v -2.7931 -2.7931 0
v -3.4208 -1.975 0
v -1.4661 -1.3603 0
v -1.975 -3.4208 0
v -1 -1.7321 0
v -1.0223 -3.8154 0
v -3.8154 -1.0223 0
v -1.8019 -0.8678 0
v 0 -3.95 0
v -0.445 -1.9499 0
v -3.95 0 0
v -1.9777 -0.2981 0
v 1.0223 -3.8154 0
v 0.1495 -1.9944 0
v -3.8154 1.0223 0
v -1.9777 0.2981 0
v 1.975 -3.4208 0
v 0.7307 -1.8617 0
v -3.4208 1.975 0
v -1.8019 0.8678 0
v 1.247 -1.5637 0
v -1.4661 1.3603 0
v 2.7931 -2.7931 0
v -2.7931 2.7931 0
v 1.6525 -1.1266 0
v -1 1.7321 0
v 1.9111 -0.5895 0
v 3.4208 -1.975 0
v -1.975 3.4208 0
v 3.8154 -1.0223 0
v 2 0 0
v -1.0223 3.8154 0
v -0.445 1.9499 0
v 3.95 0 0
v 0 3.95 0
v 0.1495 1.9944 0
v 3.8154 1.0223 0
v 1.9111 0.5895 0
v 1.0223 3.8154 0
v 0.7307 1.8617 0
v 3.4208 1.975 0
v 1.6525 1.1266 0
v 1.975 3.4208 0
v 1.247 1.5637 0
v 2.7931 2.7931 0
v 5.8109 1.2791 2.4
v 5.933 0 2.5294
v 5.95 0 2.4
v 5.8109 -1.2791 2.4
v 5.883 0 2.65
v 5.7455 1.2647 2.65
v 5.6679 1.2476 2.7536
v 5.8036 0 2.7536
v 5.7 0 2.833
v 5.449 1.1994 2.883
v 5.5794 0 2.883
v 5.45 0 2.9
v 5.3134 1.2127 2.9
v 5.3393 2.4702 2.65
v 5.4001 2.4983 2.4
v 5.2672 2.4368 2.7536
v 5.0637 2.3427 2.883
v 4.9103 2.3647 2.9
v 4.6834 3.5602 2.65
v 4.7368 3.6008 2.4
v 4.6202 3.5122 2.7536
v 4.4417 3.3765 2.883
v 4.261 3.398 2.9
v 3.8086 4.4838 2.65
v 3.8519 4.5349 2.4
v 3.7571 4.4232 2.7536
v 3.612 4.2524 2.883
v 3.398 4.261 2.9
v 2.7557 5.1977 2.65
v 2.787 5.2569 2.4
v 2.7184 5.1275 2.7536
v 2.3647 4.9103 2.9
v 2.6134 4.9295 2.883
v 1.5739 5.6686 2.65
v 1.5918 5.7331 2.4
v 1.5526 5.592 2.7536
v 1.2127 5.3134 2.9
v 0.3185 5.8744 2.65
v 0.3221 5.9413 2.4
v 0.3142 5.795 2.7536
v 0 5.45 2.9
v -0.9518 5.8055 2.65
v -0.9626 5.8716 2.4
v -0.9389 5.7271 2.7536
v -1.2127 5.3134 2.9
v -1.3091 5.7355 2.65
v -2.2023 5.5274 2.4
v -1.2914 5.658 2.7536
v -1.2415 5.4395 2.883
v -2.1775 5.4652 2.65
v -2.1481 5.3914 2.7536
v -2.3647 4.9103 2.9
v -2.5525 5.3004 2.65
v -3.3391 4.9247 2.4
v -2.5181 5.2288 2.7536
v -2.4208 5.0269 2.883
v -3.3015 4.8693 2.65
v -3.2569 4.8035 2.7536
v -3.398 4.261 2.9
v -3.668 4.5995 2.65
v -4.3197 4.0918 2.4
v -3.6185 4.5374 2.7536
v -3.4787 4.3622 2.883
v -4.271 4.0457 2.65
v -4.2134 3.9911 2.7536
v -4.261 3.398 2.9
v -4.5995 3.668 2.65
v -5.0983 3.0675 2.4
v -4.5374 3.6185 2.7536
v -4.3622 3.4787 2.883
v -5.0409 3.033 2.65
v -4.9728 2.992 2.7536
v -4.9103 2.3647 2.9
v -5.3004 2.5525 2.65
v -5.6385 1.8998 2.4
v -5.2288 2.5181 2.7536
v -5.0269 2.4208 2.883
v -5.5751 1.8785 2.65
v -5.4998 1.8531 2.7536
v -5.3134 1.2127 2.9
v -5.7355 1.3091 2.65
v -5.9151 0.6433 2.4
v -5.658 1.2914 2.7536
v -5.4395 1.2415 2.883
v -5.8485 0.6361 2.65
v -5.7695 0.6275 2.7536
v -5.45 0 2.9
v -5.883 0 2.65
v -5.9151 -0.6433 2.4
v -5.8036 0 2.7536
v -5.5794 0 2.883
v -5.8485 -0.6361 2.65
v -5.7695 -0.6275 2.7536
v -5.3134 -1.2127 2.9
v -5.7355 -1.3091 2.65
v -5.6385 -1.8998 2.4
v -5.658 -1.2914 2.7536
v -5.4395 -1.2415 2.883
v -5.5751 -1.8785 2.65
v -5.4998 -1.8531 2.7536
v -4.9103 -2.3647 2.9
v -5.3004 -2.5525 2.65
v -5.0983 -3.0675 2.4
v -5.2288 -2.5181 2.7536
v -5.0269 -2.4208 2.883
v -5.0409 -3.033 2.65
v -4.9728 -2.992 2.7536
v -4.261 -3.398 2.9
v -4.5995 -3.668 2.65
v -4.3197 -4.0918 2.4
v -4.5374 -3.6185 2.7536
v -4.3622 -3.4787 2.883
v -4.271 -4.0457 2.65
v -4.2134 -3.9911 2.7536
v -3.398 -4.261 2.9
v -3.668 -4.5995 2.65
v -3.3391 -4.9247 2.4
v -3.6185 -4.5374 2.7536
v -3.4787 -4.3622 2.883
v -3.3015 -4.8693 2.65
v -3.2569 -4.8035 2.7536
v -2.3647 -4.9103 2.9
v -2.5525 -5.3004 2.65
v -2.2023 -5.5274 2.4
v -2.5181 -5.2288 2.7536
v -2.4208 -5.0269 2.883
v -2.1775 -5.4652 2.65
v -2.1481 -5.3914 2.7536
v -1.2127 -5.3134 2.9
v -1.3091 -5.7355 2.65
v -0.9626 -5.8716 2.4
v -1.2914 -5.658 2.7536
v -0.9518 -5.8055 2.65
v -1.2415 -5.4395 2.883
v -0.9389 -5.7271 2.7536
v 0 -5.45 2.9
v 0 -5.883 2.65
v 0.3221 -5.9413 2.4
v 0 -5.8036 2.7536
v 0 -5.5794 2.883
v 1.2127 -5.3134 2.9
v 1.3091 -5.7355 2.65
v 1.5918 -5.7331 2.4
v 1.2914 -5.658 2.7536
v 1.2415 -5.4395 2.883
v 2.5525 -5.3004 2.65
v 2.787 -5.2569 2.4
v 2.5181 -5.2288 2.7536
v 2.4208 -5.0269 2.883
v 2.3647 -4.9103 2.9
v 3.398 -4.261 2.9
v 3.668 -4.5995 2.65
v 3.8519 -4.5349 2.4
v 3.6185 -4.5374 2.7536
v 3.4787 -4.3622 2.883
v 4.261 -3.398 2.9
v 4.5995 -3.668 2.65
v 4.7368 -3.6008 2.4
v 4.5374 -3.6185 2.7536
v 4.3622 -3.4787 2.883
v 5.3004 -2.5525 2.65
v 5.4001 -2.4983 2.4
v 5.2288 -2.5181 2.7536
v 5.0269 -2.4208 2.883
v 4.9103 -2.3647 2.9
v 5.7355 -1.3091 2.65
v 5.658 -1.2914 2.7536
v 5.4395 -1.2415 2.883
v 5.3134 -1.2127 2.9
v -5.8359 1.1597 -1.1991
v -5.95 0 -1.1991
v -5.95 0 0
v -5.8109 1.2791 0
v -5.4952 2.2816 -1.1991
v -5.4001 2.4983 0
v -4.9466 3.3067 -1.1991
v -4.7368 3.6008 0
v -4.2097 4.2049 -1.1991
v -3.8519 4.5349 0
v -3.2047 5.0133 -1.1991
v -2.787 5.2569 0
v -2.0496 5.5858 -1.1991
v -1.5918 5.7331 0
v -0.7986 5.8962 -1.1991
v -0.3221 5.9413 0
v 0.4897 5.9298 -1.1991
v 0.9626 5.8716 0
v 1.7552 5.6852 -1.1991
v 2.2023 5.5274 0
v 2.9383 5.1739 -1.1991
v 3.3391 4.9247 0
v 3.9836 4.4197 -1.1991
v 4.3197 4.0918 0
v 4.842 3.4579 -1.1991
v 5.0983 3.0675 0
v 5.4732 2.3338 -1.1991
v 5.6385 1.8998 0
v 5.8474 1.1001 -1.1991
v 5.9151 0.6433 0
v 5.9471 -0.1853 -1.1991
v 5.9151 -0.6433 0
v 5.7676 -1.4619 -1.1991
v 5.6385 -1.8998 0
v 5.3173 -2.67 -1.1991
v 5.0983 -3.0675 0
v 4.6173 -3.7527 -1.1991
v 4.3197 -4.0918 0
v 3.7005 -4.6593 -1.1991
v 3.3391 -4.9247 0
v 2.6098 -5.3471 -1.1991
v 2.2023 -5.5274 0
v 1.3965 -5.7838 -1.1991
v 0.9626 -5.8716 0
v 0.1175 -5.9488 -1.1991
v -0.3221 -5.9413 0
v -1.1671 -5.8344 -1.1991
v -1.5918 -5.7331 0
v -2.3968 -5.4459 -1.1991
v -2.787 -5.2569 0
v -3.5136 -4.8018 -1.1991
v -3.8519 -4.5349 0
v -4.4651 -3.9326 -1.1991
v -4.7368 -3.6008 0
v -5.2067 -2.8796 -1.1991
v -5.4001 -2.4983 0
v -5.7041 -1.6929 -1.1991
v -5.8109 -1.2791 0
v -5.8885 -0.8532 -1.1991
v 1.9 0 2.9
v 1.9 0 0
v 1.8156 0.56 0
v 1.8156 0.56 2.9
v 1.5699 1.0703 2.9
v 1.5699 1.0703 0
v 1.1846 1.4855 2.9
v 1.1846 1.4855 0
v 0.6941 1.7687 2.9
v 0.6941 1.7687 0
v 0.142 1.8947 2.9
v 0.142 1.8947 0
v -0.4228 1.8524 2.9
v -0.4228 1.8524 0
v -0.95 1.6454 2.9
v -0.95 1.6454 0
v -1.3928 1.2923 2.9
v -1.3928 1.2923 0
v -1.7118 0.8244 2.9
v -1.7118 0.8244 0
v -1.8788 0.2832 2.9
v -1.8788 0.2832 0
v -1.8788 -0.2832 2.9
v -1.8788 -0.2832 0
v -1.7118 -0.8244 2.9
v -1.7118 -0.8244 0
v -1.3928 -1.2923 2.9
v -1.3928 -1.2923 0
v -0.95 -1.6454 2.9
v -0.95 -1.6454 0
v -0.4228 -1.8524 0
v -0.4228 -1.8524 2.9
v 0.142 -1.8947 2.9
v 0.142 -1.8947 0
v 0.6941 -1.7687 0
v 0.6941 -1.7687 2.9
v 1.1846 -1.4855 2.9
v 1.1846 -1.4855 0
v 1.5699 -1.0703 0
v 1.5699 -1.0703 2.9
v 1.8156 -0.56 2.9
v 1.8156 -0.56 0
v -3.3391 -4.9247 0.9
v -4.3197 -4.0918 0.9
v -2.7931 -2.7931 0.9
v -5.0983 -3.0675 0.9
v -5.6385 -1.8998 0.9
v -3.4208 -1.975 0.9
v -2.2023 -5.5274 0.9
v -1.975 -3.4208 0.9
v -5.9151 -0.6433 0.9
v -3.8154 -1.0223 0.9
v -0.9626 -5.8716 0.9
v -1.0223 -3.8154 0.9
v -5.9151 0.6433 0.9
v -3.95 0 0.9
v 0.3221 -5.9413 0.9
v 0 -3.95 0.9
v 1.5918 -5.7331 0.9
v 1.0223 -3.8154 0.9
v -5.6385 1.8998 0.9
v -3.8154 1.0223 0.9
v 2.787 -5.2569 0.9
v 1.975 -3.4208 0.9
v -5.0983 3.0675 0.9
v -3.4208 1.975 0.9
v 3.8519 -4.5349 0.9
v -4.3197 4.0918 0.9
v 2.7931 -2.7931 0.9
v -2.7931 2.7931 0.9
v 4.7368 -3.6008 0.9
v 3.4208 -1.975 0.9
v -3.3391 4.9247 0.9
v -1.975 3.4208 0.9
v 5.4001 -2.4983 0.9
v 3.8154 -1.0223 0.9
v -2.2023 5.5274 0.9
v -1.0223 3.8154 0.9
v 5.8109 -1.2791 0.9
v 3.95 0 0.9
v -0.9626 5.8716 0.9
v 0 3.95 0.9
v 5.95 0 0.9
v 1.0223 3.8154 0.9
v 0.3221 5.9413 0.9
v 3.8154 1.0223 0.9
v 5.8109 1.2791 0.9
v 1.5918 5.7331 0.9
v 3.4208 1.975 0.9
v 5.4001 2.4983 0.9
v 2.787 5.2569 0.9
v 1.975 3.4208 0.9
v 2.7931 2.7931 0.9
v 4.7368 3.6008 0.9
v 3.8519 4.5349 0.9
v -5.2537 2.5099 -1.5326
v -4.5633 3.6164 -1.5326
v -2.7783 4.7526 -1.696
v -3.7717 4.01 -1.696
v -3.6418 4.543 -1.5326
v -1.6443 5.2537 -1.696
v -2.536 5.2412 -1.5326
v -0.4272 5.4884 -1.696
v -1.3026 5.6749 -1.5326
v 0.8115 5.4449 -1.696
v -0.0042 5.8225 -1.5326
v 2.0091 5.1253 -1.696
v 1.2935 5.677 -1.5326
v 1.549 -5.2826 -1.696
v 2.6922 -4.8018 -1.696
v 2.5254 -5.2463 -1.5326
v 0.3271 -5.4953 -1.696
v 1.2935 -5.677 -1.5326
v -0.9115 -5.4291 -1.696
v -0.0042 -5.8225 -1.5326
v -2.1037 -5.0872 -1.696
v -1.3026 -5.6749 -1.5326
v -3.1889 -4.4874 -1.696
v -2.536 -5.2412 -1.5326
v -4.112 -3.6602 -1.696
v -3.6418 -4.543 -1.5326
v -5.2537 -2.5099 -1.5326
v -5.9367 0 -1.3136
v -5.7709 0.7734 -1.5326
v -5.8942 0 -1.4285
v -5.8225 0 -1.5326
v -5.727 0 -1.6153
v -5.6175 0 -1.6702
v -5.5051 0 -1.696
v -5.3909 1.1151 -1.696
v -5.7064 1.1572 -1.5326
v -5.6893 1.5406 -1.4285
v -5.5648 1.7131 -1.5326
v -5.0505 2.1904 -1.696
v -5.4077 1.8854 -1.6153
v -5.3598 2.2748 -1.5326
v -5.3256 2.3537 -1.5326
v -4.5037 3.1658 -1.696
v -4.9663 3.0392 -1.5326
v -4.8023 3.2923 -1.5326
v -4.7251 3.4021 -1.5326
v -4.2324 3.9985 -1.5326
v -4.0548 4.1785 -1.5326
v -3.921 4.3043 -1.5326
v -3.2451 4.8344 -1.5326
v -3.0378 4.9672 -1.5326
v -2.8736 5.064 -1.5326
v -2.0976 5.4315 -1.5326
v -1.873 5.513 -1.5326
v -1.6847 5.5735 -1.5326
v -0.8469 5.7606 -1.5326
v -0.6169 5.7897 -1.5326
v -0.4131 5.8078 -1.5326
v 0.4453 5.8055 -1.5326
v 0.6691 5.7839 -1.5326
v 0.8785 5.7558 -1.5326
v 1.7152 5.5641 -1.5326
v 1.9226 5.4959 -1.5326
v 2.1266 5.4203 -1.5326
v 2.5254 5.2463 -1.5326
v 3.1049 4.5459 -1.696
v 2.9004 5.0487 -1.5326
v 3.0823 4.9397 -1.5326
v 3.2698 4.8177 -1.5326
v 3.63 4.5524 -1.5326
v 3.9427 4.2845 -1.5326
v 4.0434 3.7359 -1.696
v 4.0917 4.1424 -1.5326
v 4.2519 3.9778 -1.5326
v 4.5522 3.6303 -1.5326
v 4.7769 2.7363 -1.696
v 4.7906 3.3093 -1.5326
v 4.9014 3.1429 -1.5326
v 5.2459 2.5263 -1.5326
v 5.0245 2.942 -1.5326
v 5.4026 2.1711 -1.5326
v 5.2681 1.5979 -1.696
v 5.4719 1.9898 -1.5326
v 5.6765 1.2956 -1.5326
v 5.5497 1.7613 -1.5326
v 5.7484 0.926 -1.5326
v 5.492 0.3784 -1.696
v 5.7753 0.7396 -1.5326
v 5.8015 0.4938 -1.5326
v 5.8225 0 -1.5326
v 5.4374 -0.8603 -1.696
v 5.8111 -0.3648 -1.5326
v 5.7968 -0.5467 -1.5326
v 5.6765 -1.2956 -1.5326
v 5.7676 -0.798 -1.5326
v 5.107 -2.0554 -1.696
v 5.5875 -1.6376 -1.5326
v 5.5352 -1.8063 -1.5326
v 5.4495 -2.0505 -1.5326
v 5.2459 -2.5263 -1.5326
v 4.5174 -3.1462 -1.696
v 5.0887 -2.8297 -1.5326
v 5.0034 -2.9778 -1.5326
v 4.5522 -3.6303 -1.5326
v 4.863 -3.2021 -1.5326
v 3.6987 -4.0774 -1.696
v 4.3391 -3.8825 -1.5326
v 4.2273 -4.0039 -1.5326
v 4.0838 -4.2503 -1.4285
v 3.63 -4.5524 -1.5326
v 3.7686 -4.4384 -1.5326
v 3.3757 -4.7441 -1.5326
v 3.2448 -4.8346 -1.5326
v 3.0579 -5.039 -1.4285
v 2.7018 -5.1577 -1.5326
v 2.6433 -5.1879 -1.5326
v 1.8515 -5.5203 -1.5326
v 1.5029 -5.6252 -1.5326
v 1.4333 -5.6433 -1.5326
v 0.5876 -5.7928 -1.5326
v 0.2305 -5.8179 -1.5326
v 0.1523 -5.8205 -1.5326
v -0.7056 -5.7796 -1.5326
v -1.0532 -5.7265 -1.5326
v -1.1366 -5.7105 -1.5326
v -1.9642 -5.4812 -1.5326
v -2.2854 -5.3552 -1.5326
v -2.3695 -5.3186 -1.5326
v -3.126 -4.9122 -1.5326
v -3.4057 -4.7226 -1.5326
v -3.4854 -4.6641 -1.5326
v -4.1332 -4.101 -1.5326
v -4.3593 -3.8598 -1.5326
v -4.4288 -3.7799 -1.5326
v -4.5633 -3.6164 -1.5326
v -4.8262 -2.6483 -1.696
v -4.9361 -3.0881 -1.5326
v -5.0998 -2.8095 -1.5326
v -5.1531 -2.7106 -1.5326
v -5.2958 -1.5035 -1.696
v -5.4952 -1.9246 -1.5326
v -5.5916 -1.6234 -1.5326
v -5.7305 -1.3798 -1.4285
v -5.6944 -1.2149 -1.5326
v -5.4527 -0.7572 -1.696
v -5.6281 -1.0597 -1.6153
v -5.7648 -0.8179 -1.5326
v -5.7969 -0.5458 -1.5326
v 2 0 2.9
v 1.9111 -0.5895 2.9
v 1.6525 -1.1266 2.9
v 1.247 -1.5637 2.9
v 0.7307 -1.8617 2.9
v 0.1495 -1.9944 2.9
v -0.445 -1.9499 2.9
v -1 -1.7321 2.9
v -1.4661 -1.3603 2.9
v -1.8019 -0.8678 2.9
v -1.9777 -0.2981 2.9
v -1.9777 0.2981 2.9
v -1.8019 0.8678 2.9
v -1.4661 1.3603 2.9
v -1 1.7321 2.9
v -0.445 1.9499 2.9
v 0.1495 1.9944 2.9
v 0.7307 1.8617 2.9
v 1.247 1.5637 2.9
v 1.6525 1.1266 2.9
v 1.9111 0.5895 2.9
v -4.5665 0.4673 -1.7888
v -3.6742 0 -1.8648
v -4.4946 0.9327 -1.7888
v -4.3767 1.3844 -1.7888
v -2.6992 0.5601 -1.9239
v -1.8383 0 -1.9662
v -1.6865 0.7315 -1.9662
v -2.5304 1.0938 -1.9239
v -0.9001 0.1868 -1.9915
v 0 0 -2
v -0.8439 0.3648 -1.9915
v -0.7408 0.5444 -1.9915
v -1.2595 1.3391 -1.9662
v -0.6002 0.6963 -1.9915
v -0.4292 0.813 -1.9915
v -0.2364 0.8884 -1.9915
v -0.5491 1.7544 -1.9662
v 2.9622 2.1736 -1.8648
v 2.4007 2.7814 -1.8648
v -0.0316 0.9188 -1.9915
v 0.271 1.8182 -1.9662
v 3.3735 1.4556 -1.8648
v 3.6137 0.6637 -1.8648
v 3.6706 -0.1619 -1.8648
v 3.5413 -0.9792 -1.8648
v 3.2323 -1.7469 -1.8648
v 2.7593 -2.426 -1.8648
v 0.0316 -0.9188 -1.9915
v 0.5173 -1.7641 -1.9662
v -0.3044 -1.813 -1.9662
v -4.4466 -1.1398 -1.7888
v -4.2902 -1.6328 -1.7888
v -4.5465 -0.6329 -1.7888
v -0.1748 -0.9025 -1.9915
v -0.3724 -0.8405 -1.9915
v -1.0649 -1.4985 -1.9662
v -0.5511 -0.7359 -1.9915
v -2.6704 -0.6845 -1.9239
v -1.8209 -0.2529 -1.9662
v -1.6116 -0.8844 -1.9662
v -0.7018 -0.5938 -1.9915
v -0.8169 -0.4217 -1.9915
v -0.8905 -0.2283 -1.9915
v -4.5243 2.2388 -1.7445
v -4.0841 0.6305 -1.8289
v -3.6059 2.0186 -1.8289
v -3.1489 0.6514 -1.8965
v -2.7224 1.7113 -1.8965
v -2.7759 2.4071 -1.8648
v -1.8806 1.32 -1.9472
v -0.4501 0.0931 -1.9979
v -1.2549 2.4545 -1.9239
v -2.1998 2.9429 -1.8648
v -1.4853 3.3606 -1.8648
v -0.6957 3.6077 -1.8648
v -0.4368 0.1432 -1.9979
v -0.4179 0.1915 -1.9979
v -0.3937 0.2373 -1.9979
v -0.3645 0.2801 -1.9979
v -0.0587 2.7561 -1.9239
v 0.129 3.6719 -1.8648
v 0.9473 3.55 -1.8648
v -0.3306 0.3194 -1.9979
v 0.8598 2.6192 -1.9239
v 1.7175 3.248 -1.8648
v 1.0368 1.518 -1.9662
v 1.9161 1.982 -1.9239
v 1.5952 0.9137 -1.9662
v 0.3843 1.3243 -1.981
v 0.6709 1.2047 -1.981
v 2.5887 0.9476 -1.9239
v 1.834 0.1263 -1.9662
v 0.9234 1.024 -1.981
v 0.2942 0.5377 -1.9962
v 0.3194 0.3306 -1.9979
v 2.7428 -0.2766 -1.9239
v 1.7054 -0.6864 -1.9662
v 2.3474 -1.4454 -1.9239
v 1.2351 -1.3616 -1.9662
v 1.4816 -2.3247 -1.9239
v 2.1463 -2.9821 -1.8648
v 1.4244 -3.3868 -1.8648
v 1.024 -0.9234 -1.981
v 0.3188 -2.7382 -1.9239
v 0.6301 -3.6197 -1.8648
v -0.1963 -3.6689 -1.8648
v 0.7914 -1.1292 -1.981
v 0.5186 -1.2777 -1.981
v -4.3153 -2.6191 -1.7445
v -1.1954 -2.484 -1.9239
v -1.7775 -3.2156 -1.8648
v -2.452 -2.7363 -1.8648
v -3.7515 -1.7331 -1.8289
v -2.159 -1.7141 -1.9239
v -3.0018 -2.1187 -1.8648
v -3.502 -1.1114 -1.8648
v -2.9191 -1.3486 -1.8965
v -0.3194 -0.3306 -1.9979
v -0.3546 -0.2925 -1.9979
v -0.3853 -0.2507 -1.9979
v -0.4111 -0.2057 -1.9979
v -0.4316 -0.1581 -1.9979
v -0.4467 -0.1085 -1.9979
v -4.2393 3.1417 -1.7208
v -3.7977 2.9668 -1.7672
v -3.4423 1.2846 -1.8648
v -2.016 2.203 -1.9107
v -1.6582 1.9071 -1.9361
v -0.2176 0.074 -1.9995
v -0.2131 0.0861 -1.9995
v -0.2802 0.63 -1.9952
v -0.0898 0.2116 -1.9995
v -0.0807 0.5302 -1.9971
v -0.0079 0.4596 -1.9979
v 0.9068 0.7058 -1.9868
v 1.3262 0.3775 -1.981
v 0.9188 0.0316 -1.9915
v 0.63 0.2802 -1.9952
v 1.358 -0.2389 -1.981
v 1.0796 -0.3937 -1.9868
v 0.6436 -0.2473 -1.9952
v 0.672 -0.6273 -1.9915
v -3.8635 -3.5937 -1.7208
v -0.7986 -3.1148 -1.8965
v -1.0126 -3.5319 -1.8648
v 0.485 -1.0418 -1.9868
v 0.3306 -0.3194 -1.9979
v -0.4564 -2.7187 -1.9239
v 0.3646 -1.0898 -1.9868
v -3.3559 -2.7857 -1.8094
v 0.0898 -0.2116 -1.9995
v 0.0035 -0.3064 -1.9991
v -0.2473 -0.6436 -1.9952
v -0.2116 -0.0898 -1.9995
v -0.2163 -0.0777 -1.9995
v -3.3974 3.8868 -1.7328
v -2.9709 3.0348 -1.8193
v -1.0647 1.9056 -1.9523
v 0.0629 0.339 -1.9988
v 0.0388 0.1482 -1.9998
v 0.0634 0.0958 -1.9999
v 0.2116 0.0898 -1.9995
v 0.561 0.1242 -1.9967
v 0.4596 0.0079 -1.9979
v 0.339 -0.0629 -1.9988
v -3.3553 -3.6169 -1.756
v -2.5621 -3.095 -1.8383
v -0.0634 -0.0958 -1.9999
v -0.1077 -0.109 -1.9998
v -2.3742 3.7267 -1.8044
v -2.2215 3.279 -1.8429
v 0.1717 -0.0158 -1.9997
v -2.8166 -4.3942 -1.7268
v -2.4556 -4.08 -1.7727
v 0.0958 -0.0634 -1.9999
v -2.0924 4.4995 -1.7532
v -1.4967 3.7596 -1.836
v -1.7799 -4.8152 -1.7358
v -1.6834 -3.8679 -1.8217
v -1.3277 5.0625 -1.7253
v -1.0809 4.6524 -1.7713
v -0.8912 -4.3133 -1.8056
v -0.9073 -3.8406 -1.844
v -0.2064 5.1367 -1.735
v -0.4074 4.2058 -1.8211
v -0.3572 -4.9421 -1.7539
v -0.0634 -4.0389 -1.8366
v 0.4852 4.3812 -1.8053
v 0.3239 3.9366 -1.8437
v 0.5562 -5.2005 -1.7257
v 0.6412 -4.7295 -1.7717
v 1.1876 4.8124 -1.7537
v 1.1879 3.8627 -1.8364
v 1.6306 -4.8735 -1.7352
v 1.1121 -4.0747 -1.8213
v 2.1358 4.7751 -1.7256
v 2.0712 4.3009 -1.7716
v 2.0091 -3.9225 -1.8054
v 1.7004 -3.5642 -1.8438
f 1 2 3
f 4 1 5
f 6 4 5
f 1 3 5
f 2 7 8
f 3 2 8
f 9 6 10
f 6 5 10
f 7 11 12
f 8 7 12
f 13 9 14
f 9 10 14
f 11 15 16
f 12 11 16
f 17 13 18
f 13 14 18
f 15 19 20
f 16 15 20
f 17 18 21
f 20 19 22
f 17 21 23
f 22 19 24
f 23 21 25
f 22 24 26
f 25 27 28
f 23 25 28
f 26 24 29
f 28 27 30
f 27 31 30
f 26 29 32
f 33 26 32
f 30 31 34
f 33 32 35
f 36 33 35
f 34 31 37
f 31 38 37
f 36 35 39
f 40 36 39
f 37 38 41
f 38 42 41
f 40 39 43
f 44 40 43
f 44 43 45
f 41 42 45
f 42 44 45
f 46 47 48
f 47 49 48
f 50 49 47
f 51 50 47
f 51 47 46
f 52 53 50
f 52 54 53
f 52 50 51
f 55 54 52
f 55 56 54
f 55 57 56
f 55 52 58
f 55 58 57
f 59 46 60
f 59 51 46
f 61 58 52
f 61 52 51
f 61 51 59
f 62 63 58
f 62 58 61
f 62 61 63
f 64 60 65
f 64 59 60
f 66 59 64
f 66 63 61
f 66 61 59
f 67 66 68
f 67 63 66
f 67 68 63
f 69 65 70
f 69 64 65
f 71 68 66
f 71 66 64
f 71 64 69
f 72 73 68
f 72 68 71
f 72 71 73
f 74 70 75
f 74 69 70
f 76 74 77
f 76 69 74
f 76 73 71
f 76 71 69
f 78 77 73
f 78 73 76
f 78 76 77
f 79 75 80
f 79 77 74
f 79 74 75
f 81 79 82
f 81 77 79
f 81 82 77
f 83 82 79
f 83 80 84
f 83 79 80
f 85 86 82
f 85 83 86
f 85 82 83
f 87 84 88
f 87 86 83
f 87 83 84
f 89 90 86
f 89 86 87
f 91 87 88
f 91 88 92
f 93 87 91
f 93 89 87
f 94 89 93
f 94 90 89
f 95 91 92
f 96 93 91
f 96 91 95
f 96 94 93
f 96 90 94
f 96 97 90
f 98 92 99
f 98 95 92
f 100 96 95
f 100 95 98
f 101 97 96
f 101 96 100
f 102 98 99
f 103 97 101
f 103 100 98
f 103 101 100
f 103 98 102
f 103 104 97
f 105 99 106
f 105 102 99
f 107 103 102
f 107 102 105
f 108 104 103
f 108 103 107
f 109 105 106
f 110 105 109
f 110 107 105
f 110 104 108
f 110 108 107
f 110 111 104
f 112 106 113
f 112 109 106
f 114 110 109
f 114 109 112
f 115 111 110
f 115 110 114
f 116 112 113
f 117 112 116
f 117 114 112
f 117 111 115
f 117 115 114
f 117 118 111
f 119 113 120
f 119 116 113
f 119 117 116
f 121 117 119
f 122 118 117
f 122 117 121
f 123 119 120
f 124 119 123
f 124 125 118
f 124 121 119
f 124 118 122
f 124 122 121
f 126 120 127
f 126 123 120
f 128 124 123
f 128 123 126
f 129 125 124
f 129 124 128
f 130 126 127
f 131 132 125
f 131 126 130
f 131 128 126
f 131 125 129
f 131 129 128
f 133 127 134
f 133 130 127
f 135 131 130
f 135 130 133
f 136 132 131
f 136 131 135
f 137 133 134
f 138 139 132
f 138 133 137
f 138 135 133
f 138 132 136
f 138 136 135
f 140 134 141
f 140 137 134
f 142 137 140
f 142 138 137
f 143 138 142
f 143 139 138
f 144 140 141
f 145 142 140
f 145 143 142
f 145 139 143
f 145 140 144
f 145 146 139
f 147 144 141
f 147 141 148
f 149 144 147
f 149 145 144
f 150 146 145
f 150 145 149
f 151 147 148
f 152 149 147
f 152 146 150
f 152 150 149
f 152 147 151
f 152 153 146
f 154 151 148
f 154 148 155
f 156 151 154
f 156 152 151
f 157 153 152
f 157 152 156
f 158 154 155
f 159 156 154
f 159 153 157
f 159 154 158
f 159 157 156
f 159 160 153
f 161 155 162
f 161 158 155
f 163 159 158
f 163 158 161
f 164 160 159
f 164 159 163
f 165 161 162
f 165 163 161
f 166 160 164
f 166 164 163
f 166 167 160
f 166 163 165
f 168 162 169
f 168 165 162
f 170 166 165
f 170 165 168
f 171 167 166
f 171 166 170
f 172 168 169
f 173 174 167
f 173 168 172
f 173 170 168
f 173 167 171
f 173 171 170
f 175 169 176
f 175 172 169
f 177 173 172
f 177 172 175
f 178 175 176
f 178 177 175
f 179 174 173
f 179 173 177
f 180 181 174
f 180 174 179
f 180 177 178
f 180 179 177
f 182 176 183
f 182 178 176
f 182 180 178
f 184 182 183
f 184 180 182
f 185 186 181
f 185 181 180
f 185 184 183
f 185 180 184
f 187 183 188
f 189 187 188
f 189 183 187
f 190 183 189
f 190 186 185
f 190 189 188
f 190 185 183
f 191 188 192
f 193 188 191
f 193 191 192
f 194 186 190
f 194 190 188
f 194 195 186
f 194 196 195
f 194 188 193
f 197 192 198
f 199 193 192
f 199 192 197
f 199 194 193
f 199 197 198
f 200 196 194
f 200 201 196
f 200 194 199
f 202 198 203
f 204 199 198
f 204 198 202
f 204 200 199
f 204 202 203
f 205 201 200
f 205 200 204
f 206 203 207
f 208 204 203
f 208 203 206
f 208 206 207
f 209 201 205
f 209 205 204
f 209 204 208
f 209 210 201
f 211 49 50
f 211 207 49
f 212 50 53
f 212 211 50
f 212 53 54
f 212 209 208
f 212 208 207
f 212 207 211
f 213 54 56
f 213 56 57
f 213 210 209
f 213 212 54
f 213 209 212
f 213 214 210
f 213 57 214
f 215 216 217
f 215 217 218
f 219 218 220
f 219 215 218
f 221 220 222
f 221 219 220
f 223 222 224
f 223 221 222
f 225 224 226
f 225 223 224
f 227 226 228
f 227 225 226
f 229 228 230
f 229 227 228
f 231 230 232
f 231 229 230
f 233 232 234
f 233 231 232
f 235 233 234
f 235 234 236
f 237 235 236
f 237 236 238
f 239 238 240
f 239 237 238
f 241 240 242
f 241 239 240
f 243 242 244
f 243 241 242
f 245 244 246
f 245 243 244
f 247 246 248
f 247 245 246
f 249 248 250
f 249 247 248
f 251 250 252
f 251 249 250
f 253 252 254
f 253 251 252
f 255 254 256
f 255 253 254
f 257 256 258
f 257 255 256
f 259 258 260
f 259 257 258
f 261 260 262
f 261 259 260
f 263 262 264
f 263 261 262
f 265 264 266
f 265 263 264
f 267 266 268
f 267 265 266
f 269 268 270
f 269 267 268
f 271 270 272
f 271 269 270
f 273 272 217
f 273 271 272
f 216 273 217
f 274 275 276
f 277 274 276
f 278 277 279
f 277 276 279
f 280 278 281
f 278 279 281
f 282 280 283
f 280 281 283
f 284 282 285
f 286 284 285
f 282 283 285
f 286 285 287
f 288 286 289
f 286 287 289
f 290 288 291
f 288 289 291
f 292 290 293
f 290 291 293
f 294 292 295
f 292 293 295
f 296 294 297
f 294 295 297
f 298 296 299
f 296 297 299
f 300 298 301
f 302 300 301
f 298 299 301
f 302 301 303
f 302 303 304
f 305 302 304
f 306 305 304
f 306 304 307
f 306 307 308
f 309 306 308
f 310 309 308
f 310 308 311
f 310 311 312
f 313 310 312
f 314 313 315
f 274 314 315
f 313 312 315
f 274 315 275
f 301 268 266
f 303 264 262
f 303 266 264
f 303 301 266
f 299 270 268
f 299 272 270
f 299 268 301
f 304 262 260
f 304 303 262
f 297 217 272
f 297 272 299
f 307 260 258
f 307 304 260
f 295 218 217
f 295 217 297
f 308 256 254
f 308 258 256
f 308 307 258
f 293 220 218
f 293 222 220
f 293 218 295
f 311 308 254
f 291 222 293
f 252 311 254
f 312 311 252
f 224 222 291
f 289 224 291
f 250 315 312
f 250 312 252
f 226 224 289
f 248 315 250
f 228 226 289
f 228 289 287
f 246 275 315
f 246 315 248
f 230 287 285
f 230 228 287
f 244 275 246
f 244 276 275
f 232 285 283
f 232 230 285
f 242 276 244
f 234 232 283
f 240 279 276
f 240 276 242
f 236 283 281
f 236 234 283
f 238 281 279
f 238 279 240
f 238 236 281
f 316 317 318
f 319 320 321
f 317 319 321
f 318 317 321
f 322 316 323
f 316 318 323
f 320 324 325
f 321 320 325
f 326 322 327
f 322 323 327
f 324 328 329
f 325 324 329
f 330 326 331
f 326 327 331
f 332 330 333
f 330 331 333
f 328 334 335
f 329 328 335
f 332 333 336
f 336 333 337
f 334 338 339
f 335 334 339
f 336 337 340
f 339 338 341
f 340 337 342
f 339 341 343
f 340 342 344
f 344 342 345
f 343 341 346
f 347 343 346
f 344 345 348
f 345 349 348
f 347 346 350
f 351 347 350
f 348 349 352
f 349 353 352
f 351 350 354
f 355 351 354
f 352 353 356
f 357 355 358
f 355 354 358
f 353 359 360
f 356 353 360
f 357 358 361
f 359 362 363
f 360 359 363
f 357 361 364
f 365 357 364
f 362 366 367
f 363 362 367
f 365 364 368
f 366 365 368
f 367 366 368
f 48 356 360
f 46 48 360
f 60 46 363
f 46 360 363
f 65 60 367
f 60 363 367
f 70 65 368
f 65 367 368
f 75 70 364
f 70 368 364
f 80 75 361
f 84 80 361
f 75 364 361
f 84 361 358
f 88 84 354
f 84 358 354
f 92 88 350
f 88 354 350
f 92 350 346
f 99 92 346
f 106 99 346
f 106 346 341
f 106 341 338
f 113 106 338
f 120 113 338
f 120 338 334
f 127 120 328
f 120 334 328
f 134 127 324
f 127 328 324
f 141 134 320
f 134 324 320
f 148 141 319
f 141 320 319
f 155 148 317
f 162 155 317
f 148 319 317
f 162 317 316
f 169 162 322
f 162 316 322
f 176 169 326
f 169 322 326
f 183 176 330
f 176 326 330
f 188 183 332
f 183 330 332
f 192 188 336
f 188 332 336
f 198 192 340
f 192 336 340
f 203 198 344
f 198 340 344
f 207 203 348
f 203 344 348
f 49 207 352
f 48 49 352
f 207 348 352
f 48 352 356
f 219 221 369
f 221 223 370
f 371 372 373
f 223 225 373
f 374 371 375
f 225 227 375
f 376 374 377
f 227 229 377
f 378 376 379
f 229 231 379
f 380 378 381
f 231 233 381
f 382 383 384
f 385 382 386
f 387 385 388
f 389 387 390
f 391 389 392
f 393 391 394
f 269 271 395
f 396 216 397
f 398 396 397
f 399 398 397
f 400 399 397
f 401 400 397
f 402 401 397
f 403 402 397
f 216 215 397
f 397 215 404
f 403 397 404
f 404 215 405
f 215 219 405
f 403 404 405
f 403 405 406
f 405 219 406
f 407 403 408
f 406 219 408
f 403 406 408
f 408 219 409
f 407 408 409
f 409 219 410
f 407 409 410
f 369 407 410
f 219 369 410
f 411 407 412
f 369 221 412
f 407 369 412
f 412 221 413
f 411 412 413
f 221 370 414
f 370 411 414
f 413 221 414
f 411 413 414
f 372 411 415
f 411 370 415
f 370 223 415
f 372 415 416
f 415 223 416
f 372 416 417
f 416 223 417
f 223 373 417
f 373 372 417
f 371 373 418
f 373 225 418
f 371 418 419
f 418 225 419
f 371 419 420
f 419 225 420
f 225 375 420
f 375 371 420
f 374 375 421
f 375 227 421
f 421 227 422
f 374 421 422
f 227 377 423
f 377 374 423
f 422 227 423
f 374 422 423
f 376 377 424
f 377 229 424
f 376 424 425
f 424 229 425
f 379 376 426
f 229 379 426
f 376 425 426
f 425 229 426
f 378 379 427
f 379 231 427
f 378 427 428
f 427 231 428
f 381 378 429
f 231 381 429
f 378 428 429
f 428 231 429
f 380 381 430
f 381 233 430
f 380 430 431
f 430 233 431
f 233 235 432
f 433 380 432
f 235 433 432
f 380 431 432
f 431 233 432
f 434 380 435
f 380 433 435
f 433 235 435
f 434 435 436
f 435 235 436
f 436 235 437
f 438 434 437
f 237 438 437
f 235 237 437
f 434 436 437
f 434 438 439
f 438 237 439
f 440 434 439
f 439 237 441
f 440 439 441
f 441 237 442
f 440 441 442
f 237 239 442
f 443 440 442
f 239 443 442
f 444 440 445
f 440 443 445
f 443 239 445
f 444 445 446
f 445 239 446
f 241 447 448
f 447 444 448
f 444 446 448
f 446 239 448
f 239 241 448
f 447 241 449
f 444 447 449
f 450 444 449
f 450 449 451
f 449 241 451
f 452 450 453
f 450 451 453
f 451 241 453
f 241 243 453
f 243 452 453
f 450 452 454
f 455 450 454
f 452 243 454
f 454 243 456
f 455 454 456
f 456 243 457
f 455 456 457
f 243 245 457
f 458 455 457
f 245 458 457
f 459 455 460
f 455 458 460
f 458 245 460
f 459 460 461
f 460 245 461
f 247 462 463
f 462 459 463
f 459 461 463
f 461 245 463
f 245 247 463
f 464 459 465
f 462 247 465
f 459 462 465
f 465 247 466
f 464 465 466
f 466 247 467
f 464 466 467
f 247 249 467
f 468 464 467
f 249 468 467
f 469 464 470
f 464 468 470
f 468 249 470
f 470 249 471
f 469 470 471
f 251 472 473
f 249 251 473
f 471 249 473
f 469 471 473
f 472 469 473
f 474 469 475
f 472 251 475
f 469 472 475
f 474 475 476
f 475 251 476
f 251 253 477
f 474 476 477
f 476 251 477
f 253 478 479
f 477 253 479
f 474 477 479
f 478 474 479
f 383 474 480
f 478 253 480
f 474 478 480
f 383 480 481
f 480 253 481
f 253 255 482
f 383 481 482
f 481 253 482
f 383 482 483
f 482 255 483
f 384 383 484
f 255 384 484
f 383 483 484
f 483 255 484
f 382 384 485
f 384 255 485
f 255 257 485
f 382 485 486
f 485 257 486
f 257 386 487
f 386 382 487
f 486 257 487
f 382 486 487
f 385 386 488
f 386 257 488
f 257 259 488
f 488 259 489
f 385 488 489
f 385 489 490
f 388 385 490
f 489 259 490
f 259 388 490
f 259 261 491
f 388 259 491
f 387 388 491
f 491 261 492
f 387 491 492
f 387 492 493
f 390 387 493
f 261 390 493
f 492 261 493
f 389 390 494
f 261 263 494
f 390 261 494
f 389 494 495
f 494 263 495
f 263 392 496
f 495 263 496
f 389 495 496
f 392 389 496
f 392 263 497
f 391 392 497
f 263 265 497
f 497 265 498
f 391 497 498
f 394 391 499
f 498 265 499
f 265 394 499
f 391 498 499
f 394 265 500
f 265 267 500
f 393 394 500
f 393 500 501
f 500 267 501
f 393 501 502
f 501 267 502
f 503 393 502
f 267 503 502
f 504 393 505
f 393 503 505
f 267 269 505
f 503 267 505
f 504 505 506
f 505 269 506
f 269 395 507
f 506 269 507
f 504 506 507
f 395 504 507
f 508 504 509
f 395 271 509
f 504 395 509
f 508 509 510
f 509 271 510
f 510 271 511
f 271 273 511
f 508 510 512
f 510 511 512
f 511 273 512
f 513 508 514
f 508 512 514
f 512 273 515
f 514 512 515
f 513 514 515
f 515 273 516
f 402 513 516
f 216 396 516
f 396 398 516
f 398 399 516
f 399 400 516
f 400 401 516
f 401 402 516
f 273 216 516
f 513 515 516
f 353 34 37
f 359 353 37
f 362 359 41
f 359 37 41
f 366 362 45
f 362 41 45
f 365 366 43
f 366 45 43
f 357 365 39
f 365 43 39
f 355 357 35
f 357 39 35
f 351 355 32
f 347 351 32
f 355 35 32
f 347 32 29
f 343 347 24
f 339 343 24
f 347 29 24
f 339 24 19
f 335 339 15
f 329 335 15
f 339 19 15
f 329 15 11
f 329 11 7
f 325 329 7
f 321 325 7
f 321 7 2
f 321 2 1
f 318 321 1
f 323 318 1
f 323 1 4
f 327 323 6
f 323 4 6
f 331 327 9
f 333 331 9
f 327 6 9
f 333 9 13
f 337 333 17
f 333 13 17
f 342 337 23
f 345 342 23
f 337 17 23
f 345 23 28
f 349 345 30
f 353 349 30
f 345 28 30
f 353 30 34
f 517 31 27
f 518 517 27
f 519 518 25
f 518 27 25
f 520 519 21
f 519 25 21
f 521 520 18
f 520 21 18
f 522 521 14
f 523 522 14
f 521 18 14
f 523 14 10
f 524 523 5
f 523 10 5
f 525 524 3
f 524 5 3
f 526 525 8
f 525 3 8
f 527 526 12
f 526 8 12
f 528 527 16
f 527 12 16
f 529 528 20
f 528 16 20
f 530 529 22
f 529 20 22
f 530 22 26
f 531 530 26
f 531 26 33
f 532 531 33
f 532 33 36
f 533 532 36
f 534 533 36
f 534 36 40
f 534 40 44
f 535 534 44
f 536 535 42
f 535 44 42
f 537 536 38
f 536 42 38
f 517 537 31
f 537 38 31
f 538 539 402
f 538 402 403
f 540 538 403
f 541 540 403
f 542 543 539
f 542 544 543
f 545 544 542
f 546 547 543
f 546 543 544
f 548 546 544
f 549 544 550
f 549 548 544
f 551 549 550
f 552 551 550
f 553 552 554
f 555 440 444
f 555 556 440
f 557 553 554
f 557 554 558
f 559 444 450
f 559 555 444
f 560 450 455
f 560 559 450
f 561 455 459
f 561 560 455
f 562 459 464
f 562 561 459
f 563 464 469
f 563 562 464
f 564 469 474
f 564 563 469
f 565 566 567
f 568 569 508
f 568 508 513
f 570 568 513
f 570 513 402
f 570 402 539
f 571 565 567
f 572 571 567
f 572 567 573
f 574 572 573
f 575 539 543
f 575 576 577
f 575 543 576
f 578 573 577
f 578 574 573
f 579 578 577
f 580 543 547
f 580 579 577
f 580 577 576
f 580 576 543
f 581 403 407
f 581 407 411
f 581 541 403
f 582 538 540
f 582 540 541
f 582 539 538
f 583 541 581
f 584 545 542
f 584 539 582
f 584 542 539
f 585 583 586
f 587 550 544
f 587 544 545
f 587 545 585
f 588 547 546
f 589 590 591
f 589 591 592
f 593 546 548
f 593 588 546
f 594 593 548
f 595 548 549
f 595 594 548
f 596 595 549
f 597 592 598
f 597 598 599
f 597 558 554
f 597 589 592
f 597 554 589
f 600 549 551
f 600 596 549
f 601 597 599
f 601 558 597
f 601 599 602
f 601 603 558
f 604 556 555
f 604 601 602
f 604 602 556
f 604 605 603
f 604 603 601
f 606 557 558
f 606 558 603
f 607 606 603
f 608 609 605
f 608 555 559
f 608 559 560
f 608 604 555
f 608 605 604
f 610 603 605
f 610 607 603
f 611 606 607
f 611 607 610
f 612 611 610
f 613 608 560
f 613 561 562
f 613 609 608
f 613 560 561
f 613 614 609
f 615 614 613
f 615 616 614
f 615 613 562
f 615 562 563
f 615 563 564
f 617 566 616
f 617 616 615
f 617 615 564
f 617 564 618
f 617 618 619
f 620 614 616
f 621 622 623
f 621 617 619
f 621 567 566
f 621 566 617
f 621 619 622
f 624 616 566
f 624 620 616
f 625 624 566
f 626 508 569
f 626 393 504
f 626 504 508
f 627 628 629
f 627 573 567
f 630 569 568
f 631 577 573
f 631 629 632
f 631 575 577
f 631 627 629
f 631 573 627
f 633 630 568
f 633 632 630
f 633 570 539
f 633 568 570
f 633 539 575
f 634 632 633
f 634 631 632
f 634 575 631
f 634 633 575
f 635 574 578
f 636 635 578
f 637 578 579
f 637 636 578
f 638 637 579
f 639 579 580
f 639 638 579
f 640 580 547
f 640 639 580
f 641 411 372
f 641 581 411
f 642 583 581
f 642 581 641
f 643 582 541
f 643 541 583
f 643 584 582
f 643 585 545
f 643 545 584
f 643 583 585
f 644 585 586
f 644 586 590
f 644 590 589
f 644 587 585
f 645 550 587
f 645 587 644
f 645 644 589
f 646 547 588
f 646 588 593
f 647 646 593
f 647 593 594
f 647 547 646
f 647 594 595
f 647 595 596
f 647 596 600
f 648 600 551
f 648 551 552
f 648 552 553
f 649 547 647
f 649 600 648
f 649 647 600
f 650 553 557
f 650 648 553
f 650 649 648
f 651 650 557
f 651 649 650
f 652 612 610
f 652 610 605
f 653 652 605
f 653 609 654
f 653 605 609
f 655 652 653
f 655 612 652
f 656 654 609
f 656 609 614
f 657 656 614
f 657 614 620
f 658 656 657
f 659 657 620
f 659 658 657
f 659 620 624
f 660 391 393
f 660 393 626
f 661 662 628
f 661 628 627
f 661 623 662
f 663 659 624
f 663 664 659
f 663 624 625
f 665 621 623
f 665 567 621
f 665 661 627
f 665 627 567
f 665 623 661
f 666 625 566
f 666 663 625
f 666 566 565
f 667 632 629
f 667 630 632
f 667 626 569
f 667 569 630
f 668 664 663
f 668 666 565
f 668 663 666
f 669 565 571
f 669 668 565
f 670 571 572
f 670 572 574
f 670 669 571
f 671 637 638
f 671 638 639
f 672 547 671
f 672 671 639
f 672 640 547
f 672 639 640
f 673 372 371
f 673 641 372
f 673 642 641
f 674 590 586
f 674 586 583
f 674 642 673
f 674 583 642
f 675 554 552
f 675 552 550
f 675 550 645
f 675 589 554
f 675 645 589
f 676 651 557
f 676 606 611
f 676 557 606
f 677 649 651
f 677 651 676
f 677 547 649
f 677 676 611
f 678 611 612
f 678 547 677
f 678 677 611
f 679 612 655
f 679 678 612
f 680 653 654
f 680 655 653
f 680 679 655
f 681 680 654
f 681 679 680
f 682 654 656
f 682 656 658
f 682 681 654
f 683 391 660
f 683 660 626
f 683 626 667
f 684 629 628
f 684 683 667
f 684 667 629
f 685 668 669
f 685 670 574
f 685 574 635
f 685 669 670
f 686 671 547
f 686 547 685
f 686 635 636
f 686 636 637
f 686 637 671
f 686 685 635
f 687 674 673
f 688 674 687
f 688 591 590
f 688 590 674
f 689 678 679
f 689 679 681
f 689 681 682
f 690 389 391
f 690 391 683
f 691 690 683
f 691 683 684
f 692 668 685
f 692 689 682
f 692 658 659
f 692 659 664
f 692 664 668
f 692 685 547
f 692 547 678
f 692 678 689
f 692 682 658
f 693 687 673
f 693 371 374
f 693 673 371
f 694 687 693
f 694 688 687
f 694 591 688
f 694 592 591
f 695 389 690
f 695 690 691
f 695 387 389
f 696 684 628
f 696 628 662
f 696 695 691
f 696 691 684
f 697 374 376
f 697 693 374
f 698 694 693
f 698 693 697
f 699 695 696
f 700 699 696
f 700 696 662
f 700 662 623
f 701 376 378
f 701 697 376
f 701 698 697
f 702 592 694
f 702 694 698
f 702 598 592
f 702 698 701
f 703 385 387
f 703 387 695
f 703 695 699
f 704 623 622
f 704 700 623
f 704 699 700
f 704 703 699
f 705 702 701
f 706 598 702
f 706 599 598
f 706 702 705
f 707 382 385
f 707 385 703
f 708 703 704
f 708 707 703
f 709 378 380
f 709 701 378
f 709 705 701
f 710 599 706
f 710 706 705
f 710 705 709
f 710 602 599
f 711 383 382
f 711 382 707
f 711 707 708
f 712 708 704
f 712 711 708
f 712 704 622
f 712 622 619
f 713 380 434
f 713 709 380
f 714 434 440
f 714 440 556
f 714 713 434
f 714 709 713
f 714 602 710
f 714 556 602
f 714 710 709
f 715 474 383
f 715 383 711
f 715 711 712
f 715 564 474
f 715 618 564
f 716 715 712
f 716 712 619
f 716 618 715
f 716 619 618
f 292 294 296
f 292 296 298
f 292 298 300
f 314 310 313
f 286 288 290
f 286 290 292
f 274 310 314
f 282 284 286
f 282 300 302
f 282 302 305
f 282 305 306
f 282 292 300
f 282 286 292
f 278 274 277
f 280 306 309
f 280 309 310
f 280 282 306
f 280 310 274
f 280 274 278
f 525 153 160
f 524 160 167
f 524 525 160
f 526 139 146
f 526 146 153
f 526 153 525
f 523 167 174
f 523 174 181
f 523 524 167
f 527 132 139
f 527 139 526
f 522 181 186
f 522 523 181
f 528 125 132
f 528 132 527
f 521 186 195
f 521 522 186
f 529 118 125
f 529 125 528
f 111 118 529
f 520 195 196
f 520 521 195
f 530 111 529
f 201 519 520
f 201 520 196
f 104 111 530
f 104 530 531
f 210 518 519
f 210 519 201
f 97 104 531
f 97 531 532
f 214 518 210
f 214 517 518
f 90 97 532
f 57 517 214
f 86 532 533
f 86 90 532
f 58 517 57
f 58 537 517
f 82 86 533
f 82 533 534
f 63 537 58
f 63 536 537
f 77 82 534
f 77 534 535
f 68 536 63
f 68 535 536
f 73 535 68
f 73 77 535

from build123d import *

# Parameters (mm, degrees)
F0_R     = 3.95
F1_DEPTH = 0.9
F2_R     = 5.95
F2_R_2   = 3.95
F3_DEPTH = 2
F4_R     = 2
F5_DEPTH = 2.9
F8_R     = 1.9
F9_DEPTH = 2.9
F10_R    = 0.5
F10_2_R  = 0.5


with BuildPart() as f1:
    # F0 (on Top) → F1 (new body)
    with BuildSketch(Plane.XY):
        Circle(F0_R)
    extrude(amount=F1_DEPTH)

    # F2 (on face) → F3 (join)
    with BuildSketch(Plane.XY.offset(0.9)):
        Circle(F2_R)
        Circle(F2_R_2, mode=Mode.SUBTRACT)
        Circle(F2_R_2)
    extrude(amount=F3_DEPTH)

    # F4 (on face) → F5 (cut, through all)
    with BuildSketch(Plane(origin=(0, 0, 0), x_dir=(1, 0, 0), z_dir=(0, 0, -1))):
        Circle(F4_R)
    extrude(amount=-F5_DEPTH, mode=Mode.SUBTRACT)

    # F10
    f10_edges = [f1.edges().sort_by_distance(p)[0] for p in [
        (-5.95, 0, 2.9),
    ]]
    fillet(f10_edges, radius=F10_R)


with BuildPart() as f7:
    # F6 (on Front) → F7 (revolve)
    with BuildSketch(Plane.XZ):
        with BuildLine():
            Line((0, -2), (0, 0))
            Line((0, 0), (-5.95, 0))
            Line((-5.95, 0), (-5.95, -1.644713))
            ThreePointArc((-5.95, -1.644713), (-2.980299, -1.911099), (0, -2))
        make_face()
    revolve(axis=Axis((0, 0, -1), (0, 0, -1)))

    # F8 (on face) → F9 (join, through all)
    with BuildSketch(Plane.XY):
        Circle(F8_R)
    extrude(amount=F9_DEPTH)

    # F10#2
    f10_2_edges = [f7.edges().sort_by_distance(p)[0] for p in [
        (5.95, 0, -1.644713),
    ]]
    fillet(f10_2_edges, radius=F10_2_R)


solid = Compound([f1.part, f7.part])
